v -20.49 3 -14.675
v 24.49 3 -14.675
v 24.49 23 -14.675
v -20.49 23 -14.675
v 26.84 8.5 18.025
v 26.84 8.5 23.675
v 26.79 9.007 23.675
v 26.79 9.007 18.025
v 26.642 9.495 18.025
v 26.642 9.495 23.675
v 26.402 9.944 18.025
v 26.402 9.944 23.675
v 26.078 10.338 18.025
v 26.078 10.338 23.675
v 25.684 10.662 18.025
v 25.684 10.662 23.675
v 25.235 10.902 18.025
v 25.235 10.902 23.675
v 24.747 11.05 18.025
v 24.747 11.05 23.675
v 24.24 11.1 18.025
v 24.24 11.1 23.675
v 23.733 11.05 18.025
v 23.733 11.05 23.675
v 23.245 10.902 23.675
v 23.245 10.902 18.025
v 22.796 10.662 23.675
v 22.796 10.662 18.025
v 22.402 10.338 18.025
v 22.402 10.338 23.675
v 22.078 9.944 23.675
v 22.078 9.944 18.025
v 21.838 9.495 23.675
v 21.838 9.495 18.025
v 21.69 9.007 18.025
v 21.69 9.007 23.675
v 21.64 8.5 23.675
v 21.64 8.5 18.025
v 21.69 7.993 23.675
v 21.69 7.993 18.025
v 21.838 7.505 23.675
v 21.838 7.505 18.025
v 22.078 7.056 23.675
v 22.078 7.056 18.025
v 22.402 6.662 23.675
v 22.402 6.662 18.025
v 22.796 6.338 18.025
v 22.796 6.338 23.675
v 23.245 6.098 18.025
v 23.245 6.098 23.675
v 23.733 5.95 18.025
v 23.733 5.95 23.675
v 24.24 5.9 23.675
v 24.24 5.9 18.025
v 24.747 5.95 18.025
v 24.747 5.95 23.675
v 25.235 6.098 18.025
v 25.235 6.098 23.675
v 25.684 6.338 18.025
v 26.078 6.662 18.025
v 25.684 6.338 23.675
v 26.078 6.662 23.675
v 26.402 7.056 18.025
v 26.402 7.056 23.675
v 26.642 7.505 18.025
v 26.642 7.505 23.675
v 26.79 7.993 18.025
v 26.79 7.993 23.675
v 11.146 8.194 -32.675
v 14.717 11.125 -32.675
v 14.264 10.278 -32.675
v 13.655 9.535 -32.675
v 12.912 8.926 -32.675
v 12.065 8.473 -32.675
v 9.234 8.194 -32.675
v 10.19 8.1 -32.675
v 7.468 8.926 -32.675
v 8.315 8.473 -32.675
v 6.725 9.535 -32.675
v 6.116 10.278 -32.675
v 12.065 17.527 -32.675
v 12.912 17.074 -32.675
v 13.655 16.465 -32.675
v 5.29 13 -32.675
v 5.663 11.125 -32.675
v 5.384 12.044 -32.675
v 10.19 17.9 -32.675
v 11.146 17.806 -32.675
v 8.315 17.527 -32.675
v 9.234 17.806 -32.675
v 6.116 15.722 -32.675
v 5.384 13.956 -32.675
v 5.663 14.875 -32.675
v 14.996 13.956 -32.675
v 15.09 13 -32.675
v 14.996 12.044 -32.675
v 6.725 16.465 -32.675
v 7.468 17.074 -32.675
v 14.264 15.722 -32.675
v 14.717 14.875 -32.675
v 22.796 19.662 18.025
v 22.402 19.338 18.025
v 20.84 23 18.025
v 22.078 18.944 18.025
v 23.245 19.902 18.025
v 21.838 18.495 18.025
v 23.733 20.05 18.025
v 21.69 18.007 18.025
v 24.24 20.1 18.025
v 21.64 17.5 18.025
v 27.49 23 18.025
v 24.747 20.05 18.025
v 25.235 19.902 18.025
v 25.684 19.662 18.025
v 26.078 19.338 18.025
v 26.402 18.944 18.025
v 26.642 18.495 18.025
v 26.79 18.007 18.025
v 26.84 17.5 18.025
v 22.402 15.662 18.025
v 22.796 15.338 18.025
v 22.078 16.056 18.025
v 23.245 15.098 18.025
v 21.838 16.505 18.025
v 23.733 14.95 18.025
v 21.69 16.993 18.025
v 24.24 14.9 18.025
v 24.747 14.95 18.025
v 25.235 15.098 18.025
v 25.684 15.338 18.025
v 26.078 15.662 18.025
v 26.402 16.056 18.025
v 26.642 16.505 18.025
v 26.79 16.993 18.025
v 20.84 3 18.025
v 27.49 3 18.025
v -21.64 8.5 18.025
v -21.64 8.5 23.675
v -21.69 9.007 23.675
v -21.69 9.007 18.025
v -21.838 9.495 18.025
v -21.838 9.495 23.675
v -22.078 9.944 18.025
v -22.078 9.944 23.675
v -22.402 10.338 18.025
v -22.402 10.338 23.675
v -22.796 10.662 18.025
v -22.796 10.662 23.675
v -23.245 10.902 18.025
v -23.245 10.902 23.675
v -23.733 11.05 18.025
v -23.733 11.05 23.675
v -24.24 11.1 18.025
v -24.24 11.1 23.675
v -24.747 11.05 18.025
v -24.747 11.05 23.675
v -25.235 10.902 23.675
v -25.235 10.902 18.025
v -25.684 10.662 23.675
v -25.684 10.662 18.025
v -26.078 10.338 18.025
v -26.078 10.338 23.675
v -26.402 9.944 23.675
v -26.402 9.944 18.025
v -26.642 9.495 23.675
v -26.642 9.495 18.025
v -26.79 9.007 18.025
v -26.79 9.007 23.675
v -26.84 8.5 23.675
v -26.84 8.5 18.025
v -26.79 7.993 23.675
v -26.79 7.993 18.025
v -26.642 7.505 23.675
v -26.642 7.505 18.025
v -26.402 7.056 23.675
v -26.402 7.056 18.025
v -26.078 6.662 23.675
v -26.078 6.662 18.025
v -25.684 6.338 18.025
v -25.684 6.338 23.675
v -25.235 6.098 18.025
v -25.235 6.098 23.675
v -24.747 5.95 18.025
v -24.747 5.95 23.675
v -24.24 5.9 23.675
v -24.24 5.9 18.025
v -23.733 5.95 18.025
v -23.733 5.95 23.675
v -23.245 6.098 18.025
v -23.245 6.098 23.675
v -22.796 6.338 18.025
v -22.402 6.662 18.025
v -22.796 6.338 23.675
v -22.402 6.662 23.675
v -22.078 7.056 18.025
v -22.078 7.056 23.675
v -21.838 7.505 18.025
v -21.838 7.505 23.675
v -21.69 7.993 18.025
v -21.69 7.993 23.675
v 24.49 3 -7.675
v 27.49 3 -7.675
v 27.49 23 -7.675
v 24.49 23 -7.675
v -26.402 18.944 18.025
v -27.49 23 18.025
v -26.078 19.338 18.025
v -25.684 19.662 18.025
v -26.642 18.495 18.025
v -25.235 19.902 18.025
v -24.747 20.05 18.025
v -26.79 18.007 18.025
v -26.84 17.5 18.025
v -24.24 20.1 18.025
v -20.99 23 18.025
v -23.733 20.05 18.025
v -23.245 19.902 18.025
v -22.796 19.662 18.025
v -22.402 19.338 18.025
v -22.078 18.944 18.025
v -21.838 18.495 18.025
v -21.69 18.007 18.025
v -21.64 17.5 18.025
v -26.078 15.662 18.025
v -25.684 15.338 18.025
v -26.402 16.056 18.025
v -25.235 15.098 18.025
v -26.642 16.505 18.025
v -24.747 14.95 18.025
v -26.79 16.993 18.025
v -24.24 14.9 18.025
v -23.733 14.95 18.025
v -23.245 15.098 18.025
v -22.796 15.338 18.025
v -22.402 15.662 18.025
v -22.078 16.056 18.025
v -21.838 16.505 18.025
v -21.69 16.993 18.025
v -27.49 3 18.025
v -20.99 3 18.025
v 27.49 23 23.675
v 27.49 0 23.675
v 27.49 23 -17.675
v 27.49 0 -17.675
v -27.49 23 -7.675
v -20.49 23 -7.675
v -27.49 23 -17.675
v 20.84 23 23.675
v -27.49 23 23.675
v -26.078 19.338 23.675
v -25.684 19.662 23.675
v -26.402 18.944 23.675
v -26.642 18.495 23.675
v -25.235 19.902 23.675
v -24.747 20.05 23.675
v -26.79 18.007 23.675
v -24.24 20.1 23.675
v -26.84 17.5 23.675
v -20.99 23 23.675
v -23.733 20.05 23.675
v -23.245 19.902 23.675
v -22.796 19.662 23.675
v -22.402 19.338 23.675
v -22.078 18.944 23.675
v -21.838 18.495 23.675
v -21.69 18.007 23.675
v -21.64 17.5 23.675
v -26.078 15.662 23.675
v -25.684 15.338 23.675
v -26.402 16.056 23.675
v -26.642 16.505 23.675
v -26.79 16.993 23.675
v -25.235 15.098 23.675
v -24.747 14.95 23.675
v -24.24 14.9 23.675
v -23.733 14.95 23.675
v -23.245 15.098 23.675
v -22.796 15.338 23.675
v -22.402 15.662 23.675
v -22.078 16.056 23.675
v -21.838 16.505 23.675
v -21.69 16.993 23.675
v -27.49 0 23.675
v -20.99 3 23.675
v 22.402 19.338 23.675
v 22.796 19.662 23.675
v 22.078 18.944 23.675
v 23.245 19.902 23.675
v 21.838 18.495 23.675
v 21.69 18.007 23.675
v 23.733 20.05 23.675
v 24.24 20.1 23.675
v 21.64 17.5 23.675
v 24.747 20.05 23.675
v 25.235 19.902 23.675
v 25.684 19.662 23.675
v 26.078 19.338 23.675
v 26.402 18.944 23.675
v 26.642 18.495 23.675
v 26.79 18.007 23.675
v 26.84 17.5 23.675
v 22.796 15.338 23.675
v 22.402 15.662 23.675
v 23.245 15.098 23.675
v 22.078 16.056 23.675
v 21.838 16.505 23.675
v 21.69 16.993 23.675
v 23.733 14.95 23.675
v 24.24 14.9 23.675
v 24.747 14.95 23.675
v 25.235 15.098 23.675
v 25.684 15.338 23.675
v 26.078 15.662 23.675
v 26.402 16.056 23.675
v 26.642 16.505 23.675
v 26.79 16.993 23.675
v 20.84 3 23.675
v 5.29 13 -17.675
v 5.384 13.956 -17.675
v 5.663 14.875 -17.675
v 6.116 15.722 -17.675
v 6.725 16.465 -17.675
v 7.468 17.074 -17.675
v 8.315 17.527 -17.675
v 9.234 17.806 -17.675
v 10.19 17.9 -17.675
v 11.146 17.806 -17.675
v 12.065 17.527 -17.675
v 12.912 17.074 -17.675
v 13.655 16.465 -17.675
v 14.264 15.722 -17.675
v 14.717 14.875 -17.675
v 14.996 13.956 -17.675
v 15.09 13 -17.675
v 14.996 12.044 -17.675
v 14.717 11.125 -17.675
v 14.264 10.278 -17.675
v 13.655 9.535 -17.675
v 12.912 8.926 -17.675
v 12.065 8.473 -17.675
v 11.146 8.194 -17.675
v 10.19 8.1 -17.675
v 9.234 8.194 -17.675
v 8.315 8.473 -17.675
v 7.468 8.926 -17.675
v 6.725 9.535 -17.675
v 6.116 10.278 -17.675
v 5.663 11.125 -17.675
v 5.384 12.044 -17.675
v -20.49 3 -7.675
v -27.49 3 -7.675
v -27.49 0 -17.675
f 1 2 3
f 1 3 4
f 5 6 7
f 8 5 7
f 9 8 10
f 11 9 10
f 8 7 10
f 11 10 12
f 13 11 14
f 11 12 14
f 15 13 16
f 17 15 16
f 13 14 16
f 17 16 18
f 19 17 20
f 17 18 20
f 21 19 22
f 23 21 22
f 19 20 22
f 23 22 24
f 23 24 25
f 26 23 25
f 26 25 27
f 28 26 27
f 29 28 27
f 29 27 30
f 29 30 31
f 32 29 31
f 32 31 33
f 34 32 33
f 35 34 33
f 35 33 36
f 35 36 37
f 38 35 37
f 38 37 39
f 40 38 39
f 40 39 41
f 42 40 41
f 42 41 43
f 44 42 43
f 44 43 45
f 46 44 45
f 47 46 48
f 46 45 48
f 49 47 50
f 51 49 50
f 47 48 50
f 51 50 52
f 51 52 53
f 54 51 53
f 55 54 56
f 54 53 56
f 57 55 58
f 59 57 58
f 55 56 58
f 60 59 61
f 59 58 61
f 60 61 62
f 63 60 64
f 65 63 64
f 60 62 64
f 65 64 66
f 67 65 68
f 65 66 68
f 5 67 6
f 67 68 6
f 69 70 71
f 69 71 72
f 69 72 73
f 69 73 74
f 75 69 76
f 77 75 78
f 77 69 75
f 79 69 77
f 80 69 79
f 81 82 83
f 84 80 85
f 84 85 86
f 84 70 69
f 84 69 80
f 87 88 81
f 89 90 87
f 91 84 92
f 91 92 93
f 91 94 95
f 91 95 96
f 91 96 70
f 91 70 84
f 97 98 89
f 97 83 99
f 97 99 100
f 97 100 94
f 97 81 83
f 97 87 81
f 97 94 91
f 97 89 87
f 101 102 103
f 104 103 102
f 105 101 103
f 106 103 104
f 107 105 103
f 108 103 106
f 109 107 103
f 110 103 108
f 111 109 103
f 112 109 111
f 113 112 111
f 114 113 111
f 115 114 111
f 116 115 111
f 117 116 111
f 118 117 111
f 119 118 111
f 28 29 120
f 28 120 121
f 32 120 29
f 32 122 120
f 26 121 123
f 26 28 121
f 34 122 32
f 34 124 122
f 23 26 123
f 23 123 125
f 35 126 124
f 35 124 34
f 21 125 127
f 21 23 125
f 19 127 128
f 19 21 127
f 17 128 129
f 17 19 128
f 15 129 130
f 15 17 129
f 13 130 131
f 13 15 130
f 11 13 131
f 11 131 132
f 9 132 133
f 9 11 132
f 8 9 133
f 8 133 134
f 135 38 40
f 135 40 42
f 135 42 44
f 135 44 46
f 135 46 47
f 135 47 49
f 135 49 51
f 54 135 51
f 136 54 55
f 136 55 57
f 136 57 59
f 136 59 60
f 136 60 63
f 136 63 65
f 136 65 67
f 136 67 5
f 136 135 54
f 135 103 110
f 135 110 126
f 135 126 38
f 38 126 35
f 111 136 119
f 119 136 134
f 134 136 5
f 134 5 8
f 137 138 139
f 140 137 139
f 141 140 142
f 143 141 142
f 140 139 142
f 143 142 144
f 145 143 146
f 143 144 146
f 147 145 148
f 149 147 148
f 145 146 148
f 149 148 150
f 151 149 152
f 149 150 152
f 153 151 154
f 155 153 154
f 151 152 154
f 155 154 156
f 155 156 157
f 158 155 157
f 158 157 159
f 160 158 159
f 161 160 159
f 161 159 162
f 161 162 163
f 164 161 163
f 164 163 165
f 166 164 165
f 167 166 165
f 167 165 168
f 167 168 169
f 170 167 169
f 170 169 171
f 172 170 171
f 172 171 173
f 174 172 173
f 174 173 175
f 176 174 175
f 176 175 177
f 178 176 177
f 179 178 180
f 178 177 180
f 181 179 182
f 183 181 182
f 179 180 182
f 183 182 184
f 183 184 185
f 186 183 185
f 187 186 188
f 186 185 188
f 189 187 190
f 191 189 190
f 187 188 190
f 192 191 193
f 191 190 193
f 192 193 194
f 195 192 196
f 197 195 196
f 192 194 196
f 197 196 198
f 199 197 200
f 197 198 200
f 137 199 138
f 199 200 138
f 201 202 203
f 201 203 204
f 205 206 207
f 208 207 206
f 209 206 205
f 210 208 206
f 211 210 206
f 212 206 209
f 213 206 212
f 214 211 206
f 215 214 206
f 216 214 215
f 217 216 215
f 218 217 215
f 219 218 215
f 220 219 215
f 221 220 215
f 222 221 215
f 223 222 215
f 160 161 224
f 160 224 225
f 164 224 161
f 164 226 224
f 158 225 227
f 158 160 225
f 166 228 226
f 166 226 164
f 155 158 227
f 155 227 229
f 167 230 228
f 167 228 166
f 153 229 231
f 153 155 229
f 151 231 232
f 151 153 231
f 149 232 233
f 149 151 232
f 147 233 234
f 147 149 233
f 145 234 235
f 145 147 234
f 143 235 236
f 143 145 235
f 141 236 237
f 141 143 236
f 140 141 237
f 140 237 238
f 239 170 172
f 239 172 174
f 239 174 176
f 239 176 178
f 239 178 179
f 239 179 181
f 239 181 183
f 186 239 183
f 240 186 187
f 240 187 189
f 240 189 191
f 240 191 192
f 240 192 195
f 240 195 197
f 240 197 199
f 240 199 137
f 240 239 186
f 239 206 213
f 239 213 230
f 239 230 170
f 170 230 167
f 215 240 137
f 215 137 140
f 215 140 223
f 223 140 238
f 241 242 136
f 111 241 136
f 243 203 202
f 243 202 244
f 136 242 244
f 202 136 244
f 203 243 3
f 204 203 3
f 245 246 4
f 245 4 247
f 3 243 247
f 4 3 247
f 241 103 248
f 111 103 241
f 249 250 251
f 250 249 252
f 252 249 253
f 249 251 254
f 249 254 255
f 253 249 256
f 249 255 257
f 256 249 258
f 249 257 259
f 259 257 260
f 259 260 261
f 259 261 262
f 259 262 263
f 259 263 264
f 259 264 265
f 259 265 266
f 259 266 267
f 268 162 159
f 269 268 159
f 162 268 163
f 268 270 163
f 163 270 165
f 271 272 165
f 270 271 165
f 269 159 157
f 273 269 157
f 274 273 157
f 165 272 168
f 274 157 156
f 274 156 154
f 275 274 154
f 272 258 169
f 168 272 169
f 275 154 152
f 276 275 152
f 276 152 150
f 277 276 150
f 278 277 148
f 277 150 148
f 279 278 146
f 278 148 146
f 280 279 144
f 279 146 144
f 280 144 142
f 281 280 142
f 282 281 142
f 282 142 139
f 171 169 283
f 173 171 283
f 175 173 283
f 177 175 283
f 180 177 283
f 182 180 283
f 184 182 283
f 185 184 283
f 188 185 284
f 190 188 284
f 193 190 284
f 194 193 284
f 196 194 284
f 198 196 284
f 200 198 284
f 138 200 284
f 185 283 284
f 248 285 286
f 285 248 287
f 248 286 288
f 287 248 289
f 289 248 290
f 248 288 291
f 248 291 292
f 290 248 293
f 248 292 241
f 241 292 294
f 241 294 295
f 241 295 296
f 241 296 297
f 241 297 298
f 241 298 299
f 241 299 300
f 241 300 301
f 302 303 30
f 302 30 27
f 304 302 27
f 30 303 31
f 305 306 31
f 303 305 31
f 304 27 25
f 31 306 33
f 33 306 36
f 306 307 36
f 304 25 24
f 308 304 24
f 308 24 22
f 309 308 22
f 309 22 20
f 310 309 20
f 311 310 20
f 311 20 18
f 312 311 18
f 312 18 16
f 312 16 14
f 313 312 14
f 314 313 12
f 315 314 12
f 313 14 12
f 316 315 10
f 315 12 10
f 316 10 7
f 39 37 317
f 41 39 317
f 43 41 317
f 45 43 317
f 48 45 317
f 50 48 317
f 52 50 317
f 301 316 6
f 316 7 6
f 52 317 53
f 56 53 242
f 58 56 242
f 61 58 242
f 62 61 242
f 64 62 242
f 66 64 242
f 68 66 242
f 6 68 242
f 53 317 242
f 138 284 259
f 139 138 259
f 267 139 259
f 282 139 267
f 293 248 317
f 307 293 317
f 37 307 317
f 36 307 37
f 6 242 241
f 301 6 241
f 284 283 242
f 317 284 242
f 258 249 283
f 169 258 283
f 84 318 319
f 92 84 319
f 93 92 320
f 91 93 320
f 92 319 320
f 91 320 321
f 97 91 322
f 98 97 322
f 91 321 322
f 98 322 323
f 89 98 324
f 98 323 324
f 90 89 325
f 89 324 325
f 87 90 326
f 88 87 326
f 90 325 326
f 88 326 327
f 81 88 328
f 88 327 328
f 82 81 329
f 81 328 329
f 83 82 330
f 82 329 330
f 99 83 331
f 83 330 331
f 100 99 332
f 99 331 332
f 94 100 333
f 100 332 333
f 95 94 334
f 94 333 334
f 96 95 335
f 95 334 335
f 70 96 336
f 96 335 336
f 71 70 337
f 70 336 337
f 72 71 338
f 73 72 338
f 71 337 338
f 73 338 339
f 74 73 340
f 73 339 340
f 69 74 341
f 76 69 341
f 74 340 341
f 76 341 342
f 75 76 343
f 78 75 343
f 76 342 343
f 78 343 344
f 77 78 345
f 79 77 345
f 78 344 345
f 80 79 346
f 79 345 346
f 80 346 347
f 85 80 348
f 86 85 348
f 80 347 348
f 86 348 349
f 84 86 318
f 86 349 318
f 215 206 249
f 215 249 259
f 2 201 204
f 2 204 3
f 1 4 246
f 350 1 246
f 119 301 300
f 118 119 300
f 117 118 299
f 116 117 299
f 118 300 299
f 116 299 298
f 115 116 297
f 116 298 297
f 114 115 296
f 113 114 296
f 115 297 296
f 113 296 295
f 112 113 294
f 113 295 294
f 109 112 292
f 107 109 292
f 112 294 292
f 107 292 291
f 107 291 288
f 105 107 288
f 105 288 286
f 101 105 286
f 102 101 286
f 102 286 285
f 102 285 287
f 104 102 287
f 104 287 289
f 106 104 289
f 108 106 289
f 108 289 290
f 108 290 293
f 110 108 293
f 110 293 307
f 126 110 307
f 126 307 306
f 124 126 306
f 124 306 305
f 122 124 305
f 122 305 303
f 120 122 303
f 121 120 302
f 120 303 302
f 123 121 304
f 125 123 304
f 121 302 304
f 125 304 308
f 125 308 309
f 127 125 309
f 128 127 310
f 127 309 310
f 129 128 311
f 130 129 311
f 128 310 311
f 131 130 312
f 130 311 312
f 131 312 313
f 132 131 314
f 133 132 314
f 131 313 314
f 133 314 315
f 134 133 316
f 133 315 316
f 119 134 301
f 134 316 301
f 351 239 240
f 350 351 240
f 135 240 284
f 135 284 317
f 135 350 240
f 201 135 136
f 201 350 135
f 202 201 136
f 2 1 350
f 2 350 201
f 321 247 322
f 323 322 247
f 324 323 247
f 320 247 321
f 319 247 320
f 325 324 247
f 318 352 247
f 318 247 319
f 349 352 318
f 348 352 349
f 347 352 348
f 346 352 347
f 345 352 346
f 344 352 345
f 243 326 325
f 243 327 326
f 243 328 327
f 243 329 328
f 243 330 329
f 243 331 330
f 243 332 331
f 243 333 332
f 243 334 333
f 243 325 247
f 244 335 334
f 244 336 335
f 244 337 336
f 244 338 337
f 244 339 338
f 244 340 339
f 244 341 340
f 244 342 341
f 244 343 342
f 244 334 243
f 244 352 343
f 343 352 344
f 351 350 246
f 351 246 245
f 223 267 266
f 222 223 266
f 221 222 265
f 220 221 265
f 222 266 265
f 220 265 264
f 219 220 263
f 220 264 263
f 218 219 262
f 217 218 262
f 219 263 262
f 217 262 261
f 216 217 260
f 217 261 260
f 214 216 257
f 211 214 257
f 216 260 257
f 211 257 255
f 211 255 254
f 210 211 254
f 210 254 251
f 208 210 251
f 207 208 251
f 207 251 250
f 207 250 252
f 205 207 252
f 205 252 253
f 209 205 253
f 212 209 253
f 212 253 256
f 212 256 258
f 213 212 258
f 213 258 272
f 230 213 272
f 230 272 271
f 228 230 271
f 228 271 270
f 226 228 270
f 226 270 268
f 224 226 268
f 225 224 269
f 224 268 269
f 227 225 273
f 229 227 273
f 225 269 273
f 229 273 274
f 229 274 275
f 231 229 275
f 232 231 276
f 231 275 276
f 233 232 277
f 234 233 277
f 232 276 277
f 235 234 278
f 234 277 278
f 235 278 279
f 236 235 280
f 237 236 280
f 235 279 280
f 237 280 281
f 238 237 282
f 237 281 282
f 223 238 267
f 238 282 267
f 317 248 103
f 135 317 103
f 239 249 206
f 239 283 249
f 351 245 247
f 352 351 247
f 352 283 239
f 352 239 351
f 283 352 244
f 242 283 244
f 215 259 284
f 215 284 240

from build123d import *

# Parameters (mm, degrees)
SKETCH1_W           = 54.98
SKETCH1_H           = 41.35
BOSS_EXTRUDE1_DEPTH = 3
SKETCH2_W           = 6.5
SKETCH2_H           = 5.65
SKETCH2_W_2         = 6.65
BOSS_EXTRUDE2_DEPTH = 20
SKETCH3_R           = 4.9
BOSS_EXTRUDE3_DEPTH = 15
CUT_EXTRUDE1_REACH  = 68.783
SKETCH4_R           = 2.6


with BuildPart() as part:
    # Sketch1 → Boss-Extrude1 (new body)
    with BuildSketch(Plane(origin=(0, 0, 0), x_dir=(1, 0, 0), z_dir=(0, 1, 0))):
        with Locations((0, -3)):
            Rectangle(SKETCH1_W, SKETCH1_H)
    extrude(amount=BOSS_EXTRUDE1_DEPTH)

    # Sketch2 → Boss-Extrude2 (add)
    with BuildSketch(Plane(origin=(0, 3, 0), x_dir=(1, 0, 0), z_dir=(0, 1, 0))):
        with Locations((-24.24, -20.85)):
            Rectangle(SKETCH2_W, SKETCH2_H)
        with Locations((24.165, -20.85)):
            Rectangle(SKETCH2_W_2, SKETCH2_H)
        Polygon((-27.49, 17.675), (27.49, 17.675), (27.49, 7.675), (24.49, 7.675), (24.49, 14.675), (-20.49, 14.675), (-20.49, 7.675), (-27.49, 7.675), align=None)
    extrude(amount=BOSS_EXTRUDE2_DEPTH)

    # Sketch3 → Boss-Extrude3 (add)
    with BuildSketch(Plane(origin=(0, 0, -17.675), x_dir=(-1, 0, 0), z_dir=(0, 0, -1))):
        with Locations((-10.19, 13)):
            Circle(SKETCH3_R)
    extrude(amount=BOSS_EXTRUDE3_DEPTH)

    # Sketch4 → Cut-Extrude1 (cut, up to next)
    with BuildSketch(Plane.XY.offset(23.675), mode=Mode.PRIVATE) as cut_extrude1_sk1:
        with Locations((-24.24, 17.5)):
            Circle(SKETCH4_R)
    cut_extrude1_tool1 = extrude(cut_extrude1_sk1.sketch, amount=-CUT_EXTRUDE1_REACH, mode=Mode.PRIVATE) & part.part
    # Sketch4 → Cut-Extrude1 (cut, up to next)
    with BuildSketch(Plane.XY.offset(23.675), mode=Mode.PRIVATE) as cut_extrude1_sk2:
        with Locations((-24.24, 8.5)):
            Circle(SKETCH4_R)
    cut_extrude1_tool2 = extrude(cut_extrude1_sk2.sketch, amount=-CUT_EXTRUDE1_REACH, mode=Mode.PRIVATE) & part.part
    # Sketch4 → Cut-Extrude1 (cut, up to next)
    with BuildSketch(Plane.XY.offset(23.675), mode=Mode.PRIVATE) as cut_extrude1_sk3:
        with Locations((24.24, 17.5)):
            Circle(SKETCH4_R)
    cut_extrude1_tool3 = extrude(cut_extrude1_sk3.sketch, amount=-CUT_EXTRUDE1_REACH, mode=Mode.PRIVATE) & part.part
    # Sketch4 → Cut-Extrude1 (cut, up to next)
    with BuildSketch(Plane.XY.offset(23.675), mode=Mode.PRIVATE) as cut_extrude1_sk4:
        with Locations((24.24, 8.5)):
            Circle(SKETCH4_R)
    cut_extrude1_tool4 = extrude(cut_extrude1_sk4.sketch, amount=-CUT_EXTRUDE1_REACH, mode=Mode.PRIVATE) & part.part
    add(cut_extrude1_tool1.solids().sort_by_distance((-24.24, 17.5, 23.675))[0], mode=Mode.SUBTRACT)
    add(cut_extrude1_tool2.solids().sort_by_distance((-24.24, 8.5, 23.675))[0], mode=Mode.SUBTRACT)
    add(cut_extrude1_tool3.solids().sort_by_distance((24.24, 17.5, 23.675))[0], mode=Mode.SUBTRACT)
    add(cut_extrude1_tool4.solids().sort_by_distance((24.24, 8.5, 23.675))[0], mode=Mode.SUBTRACT)


solid = part.part
